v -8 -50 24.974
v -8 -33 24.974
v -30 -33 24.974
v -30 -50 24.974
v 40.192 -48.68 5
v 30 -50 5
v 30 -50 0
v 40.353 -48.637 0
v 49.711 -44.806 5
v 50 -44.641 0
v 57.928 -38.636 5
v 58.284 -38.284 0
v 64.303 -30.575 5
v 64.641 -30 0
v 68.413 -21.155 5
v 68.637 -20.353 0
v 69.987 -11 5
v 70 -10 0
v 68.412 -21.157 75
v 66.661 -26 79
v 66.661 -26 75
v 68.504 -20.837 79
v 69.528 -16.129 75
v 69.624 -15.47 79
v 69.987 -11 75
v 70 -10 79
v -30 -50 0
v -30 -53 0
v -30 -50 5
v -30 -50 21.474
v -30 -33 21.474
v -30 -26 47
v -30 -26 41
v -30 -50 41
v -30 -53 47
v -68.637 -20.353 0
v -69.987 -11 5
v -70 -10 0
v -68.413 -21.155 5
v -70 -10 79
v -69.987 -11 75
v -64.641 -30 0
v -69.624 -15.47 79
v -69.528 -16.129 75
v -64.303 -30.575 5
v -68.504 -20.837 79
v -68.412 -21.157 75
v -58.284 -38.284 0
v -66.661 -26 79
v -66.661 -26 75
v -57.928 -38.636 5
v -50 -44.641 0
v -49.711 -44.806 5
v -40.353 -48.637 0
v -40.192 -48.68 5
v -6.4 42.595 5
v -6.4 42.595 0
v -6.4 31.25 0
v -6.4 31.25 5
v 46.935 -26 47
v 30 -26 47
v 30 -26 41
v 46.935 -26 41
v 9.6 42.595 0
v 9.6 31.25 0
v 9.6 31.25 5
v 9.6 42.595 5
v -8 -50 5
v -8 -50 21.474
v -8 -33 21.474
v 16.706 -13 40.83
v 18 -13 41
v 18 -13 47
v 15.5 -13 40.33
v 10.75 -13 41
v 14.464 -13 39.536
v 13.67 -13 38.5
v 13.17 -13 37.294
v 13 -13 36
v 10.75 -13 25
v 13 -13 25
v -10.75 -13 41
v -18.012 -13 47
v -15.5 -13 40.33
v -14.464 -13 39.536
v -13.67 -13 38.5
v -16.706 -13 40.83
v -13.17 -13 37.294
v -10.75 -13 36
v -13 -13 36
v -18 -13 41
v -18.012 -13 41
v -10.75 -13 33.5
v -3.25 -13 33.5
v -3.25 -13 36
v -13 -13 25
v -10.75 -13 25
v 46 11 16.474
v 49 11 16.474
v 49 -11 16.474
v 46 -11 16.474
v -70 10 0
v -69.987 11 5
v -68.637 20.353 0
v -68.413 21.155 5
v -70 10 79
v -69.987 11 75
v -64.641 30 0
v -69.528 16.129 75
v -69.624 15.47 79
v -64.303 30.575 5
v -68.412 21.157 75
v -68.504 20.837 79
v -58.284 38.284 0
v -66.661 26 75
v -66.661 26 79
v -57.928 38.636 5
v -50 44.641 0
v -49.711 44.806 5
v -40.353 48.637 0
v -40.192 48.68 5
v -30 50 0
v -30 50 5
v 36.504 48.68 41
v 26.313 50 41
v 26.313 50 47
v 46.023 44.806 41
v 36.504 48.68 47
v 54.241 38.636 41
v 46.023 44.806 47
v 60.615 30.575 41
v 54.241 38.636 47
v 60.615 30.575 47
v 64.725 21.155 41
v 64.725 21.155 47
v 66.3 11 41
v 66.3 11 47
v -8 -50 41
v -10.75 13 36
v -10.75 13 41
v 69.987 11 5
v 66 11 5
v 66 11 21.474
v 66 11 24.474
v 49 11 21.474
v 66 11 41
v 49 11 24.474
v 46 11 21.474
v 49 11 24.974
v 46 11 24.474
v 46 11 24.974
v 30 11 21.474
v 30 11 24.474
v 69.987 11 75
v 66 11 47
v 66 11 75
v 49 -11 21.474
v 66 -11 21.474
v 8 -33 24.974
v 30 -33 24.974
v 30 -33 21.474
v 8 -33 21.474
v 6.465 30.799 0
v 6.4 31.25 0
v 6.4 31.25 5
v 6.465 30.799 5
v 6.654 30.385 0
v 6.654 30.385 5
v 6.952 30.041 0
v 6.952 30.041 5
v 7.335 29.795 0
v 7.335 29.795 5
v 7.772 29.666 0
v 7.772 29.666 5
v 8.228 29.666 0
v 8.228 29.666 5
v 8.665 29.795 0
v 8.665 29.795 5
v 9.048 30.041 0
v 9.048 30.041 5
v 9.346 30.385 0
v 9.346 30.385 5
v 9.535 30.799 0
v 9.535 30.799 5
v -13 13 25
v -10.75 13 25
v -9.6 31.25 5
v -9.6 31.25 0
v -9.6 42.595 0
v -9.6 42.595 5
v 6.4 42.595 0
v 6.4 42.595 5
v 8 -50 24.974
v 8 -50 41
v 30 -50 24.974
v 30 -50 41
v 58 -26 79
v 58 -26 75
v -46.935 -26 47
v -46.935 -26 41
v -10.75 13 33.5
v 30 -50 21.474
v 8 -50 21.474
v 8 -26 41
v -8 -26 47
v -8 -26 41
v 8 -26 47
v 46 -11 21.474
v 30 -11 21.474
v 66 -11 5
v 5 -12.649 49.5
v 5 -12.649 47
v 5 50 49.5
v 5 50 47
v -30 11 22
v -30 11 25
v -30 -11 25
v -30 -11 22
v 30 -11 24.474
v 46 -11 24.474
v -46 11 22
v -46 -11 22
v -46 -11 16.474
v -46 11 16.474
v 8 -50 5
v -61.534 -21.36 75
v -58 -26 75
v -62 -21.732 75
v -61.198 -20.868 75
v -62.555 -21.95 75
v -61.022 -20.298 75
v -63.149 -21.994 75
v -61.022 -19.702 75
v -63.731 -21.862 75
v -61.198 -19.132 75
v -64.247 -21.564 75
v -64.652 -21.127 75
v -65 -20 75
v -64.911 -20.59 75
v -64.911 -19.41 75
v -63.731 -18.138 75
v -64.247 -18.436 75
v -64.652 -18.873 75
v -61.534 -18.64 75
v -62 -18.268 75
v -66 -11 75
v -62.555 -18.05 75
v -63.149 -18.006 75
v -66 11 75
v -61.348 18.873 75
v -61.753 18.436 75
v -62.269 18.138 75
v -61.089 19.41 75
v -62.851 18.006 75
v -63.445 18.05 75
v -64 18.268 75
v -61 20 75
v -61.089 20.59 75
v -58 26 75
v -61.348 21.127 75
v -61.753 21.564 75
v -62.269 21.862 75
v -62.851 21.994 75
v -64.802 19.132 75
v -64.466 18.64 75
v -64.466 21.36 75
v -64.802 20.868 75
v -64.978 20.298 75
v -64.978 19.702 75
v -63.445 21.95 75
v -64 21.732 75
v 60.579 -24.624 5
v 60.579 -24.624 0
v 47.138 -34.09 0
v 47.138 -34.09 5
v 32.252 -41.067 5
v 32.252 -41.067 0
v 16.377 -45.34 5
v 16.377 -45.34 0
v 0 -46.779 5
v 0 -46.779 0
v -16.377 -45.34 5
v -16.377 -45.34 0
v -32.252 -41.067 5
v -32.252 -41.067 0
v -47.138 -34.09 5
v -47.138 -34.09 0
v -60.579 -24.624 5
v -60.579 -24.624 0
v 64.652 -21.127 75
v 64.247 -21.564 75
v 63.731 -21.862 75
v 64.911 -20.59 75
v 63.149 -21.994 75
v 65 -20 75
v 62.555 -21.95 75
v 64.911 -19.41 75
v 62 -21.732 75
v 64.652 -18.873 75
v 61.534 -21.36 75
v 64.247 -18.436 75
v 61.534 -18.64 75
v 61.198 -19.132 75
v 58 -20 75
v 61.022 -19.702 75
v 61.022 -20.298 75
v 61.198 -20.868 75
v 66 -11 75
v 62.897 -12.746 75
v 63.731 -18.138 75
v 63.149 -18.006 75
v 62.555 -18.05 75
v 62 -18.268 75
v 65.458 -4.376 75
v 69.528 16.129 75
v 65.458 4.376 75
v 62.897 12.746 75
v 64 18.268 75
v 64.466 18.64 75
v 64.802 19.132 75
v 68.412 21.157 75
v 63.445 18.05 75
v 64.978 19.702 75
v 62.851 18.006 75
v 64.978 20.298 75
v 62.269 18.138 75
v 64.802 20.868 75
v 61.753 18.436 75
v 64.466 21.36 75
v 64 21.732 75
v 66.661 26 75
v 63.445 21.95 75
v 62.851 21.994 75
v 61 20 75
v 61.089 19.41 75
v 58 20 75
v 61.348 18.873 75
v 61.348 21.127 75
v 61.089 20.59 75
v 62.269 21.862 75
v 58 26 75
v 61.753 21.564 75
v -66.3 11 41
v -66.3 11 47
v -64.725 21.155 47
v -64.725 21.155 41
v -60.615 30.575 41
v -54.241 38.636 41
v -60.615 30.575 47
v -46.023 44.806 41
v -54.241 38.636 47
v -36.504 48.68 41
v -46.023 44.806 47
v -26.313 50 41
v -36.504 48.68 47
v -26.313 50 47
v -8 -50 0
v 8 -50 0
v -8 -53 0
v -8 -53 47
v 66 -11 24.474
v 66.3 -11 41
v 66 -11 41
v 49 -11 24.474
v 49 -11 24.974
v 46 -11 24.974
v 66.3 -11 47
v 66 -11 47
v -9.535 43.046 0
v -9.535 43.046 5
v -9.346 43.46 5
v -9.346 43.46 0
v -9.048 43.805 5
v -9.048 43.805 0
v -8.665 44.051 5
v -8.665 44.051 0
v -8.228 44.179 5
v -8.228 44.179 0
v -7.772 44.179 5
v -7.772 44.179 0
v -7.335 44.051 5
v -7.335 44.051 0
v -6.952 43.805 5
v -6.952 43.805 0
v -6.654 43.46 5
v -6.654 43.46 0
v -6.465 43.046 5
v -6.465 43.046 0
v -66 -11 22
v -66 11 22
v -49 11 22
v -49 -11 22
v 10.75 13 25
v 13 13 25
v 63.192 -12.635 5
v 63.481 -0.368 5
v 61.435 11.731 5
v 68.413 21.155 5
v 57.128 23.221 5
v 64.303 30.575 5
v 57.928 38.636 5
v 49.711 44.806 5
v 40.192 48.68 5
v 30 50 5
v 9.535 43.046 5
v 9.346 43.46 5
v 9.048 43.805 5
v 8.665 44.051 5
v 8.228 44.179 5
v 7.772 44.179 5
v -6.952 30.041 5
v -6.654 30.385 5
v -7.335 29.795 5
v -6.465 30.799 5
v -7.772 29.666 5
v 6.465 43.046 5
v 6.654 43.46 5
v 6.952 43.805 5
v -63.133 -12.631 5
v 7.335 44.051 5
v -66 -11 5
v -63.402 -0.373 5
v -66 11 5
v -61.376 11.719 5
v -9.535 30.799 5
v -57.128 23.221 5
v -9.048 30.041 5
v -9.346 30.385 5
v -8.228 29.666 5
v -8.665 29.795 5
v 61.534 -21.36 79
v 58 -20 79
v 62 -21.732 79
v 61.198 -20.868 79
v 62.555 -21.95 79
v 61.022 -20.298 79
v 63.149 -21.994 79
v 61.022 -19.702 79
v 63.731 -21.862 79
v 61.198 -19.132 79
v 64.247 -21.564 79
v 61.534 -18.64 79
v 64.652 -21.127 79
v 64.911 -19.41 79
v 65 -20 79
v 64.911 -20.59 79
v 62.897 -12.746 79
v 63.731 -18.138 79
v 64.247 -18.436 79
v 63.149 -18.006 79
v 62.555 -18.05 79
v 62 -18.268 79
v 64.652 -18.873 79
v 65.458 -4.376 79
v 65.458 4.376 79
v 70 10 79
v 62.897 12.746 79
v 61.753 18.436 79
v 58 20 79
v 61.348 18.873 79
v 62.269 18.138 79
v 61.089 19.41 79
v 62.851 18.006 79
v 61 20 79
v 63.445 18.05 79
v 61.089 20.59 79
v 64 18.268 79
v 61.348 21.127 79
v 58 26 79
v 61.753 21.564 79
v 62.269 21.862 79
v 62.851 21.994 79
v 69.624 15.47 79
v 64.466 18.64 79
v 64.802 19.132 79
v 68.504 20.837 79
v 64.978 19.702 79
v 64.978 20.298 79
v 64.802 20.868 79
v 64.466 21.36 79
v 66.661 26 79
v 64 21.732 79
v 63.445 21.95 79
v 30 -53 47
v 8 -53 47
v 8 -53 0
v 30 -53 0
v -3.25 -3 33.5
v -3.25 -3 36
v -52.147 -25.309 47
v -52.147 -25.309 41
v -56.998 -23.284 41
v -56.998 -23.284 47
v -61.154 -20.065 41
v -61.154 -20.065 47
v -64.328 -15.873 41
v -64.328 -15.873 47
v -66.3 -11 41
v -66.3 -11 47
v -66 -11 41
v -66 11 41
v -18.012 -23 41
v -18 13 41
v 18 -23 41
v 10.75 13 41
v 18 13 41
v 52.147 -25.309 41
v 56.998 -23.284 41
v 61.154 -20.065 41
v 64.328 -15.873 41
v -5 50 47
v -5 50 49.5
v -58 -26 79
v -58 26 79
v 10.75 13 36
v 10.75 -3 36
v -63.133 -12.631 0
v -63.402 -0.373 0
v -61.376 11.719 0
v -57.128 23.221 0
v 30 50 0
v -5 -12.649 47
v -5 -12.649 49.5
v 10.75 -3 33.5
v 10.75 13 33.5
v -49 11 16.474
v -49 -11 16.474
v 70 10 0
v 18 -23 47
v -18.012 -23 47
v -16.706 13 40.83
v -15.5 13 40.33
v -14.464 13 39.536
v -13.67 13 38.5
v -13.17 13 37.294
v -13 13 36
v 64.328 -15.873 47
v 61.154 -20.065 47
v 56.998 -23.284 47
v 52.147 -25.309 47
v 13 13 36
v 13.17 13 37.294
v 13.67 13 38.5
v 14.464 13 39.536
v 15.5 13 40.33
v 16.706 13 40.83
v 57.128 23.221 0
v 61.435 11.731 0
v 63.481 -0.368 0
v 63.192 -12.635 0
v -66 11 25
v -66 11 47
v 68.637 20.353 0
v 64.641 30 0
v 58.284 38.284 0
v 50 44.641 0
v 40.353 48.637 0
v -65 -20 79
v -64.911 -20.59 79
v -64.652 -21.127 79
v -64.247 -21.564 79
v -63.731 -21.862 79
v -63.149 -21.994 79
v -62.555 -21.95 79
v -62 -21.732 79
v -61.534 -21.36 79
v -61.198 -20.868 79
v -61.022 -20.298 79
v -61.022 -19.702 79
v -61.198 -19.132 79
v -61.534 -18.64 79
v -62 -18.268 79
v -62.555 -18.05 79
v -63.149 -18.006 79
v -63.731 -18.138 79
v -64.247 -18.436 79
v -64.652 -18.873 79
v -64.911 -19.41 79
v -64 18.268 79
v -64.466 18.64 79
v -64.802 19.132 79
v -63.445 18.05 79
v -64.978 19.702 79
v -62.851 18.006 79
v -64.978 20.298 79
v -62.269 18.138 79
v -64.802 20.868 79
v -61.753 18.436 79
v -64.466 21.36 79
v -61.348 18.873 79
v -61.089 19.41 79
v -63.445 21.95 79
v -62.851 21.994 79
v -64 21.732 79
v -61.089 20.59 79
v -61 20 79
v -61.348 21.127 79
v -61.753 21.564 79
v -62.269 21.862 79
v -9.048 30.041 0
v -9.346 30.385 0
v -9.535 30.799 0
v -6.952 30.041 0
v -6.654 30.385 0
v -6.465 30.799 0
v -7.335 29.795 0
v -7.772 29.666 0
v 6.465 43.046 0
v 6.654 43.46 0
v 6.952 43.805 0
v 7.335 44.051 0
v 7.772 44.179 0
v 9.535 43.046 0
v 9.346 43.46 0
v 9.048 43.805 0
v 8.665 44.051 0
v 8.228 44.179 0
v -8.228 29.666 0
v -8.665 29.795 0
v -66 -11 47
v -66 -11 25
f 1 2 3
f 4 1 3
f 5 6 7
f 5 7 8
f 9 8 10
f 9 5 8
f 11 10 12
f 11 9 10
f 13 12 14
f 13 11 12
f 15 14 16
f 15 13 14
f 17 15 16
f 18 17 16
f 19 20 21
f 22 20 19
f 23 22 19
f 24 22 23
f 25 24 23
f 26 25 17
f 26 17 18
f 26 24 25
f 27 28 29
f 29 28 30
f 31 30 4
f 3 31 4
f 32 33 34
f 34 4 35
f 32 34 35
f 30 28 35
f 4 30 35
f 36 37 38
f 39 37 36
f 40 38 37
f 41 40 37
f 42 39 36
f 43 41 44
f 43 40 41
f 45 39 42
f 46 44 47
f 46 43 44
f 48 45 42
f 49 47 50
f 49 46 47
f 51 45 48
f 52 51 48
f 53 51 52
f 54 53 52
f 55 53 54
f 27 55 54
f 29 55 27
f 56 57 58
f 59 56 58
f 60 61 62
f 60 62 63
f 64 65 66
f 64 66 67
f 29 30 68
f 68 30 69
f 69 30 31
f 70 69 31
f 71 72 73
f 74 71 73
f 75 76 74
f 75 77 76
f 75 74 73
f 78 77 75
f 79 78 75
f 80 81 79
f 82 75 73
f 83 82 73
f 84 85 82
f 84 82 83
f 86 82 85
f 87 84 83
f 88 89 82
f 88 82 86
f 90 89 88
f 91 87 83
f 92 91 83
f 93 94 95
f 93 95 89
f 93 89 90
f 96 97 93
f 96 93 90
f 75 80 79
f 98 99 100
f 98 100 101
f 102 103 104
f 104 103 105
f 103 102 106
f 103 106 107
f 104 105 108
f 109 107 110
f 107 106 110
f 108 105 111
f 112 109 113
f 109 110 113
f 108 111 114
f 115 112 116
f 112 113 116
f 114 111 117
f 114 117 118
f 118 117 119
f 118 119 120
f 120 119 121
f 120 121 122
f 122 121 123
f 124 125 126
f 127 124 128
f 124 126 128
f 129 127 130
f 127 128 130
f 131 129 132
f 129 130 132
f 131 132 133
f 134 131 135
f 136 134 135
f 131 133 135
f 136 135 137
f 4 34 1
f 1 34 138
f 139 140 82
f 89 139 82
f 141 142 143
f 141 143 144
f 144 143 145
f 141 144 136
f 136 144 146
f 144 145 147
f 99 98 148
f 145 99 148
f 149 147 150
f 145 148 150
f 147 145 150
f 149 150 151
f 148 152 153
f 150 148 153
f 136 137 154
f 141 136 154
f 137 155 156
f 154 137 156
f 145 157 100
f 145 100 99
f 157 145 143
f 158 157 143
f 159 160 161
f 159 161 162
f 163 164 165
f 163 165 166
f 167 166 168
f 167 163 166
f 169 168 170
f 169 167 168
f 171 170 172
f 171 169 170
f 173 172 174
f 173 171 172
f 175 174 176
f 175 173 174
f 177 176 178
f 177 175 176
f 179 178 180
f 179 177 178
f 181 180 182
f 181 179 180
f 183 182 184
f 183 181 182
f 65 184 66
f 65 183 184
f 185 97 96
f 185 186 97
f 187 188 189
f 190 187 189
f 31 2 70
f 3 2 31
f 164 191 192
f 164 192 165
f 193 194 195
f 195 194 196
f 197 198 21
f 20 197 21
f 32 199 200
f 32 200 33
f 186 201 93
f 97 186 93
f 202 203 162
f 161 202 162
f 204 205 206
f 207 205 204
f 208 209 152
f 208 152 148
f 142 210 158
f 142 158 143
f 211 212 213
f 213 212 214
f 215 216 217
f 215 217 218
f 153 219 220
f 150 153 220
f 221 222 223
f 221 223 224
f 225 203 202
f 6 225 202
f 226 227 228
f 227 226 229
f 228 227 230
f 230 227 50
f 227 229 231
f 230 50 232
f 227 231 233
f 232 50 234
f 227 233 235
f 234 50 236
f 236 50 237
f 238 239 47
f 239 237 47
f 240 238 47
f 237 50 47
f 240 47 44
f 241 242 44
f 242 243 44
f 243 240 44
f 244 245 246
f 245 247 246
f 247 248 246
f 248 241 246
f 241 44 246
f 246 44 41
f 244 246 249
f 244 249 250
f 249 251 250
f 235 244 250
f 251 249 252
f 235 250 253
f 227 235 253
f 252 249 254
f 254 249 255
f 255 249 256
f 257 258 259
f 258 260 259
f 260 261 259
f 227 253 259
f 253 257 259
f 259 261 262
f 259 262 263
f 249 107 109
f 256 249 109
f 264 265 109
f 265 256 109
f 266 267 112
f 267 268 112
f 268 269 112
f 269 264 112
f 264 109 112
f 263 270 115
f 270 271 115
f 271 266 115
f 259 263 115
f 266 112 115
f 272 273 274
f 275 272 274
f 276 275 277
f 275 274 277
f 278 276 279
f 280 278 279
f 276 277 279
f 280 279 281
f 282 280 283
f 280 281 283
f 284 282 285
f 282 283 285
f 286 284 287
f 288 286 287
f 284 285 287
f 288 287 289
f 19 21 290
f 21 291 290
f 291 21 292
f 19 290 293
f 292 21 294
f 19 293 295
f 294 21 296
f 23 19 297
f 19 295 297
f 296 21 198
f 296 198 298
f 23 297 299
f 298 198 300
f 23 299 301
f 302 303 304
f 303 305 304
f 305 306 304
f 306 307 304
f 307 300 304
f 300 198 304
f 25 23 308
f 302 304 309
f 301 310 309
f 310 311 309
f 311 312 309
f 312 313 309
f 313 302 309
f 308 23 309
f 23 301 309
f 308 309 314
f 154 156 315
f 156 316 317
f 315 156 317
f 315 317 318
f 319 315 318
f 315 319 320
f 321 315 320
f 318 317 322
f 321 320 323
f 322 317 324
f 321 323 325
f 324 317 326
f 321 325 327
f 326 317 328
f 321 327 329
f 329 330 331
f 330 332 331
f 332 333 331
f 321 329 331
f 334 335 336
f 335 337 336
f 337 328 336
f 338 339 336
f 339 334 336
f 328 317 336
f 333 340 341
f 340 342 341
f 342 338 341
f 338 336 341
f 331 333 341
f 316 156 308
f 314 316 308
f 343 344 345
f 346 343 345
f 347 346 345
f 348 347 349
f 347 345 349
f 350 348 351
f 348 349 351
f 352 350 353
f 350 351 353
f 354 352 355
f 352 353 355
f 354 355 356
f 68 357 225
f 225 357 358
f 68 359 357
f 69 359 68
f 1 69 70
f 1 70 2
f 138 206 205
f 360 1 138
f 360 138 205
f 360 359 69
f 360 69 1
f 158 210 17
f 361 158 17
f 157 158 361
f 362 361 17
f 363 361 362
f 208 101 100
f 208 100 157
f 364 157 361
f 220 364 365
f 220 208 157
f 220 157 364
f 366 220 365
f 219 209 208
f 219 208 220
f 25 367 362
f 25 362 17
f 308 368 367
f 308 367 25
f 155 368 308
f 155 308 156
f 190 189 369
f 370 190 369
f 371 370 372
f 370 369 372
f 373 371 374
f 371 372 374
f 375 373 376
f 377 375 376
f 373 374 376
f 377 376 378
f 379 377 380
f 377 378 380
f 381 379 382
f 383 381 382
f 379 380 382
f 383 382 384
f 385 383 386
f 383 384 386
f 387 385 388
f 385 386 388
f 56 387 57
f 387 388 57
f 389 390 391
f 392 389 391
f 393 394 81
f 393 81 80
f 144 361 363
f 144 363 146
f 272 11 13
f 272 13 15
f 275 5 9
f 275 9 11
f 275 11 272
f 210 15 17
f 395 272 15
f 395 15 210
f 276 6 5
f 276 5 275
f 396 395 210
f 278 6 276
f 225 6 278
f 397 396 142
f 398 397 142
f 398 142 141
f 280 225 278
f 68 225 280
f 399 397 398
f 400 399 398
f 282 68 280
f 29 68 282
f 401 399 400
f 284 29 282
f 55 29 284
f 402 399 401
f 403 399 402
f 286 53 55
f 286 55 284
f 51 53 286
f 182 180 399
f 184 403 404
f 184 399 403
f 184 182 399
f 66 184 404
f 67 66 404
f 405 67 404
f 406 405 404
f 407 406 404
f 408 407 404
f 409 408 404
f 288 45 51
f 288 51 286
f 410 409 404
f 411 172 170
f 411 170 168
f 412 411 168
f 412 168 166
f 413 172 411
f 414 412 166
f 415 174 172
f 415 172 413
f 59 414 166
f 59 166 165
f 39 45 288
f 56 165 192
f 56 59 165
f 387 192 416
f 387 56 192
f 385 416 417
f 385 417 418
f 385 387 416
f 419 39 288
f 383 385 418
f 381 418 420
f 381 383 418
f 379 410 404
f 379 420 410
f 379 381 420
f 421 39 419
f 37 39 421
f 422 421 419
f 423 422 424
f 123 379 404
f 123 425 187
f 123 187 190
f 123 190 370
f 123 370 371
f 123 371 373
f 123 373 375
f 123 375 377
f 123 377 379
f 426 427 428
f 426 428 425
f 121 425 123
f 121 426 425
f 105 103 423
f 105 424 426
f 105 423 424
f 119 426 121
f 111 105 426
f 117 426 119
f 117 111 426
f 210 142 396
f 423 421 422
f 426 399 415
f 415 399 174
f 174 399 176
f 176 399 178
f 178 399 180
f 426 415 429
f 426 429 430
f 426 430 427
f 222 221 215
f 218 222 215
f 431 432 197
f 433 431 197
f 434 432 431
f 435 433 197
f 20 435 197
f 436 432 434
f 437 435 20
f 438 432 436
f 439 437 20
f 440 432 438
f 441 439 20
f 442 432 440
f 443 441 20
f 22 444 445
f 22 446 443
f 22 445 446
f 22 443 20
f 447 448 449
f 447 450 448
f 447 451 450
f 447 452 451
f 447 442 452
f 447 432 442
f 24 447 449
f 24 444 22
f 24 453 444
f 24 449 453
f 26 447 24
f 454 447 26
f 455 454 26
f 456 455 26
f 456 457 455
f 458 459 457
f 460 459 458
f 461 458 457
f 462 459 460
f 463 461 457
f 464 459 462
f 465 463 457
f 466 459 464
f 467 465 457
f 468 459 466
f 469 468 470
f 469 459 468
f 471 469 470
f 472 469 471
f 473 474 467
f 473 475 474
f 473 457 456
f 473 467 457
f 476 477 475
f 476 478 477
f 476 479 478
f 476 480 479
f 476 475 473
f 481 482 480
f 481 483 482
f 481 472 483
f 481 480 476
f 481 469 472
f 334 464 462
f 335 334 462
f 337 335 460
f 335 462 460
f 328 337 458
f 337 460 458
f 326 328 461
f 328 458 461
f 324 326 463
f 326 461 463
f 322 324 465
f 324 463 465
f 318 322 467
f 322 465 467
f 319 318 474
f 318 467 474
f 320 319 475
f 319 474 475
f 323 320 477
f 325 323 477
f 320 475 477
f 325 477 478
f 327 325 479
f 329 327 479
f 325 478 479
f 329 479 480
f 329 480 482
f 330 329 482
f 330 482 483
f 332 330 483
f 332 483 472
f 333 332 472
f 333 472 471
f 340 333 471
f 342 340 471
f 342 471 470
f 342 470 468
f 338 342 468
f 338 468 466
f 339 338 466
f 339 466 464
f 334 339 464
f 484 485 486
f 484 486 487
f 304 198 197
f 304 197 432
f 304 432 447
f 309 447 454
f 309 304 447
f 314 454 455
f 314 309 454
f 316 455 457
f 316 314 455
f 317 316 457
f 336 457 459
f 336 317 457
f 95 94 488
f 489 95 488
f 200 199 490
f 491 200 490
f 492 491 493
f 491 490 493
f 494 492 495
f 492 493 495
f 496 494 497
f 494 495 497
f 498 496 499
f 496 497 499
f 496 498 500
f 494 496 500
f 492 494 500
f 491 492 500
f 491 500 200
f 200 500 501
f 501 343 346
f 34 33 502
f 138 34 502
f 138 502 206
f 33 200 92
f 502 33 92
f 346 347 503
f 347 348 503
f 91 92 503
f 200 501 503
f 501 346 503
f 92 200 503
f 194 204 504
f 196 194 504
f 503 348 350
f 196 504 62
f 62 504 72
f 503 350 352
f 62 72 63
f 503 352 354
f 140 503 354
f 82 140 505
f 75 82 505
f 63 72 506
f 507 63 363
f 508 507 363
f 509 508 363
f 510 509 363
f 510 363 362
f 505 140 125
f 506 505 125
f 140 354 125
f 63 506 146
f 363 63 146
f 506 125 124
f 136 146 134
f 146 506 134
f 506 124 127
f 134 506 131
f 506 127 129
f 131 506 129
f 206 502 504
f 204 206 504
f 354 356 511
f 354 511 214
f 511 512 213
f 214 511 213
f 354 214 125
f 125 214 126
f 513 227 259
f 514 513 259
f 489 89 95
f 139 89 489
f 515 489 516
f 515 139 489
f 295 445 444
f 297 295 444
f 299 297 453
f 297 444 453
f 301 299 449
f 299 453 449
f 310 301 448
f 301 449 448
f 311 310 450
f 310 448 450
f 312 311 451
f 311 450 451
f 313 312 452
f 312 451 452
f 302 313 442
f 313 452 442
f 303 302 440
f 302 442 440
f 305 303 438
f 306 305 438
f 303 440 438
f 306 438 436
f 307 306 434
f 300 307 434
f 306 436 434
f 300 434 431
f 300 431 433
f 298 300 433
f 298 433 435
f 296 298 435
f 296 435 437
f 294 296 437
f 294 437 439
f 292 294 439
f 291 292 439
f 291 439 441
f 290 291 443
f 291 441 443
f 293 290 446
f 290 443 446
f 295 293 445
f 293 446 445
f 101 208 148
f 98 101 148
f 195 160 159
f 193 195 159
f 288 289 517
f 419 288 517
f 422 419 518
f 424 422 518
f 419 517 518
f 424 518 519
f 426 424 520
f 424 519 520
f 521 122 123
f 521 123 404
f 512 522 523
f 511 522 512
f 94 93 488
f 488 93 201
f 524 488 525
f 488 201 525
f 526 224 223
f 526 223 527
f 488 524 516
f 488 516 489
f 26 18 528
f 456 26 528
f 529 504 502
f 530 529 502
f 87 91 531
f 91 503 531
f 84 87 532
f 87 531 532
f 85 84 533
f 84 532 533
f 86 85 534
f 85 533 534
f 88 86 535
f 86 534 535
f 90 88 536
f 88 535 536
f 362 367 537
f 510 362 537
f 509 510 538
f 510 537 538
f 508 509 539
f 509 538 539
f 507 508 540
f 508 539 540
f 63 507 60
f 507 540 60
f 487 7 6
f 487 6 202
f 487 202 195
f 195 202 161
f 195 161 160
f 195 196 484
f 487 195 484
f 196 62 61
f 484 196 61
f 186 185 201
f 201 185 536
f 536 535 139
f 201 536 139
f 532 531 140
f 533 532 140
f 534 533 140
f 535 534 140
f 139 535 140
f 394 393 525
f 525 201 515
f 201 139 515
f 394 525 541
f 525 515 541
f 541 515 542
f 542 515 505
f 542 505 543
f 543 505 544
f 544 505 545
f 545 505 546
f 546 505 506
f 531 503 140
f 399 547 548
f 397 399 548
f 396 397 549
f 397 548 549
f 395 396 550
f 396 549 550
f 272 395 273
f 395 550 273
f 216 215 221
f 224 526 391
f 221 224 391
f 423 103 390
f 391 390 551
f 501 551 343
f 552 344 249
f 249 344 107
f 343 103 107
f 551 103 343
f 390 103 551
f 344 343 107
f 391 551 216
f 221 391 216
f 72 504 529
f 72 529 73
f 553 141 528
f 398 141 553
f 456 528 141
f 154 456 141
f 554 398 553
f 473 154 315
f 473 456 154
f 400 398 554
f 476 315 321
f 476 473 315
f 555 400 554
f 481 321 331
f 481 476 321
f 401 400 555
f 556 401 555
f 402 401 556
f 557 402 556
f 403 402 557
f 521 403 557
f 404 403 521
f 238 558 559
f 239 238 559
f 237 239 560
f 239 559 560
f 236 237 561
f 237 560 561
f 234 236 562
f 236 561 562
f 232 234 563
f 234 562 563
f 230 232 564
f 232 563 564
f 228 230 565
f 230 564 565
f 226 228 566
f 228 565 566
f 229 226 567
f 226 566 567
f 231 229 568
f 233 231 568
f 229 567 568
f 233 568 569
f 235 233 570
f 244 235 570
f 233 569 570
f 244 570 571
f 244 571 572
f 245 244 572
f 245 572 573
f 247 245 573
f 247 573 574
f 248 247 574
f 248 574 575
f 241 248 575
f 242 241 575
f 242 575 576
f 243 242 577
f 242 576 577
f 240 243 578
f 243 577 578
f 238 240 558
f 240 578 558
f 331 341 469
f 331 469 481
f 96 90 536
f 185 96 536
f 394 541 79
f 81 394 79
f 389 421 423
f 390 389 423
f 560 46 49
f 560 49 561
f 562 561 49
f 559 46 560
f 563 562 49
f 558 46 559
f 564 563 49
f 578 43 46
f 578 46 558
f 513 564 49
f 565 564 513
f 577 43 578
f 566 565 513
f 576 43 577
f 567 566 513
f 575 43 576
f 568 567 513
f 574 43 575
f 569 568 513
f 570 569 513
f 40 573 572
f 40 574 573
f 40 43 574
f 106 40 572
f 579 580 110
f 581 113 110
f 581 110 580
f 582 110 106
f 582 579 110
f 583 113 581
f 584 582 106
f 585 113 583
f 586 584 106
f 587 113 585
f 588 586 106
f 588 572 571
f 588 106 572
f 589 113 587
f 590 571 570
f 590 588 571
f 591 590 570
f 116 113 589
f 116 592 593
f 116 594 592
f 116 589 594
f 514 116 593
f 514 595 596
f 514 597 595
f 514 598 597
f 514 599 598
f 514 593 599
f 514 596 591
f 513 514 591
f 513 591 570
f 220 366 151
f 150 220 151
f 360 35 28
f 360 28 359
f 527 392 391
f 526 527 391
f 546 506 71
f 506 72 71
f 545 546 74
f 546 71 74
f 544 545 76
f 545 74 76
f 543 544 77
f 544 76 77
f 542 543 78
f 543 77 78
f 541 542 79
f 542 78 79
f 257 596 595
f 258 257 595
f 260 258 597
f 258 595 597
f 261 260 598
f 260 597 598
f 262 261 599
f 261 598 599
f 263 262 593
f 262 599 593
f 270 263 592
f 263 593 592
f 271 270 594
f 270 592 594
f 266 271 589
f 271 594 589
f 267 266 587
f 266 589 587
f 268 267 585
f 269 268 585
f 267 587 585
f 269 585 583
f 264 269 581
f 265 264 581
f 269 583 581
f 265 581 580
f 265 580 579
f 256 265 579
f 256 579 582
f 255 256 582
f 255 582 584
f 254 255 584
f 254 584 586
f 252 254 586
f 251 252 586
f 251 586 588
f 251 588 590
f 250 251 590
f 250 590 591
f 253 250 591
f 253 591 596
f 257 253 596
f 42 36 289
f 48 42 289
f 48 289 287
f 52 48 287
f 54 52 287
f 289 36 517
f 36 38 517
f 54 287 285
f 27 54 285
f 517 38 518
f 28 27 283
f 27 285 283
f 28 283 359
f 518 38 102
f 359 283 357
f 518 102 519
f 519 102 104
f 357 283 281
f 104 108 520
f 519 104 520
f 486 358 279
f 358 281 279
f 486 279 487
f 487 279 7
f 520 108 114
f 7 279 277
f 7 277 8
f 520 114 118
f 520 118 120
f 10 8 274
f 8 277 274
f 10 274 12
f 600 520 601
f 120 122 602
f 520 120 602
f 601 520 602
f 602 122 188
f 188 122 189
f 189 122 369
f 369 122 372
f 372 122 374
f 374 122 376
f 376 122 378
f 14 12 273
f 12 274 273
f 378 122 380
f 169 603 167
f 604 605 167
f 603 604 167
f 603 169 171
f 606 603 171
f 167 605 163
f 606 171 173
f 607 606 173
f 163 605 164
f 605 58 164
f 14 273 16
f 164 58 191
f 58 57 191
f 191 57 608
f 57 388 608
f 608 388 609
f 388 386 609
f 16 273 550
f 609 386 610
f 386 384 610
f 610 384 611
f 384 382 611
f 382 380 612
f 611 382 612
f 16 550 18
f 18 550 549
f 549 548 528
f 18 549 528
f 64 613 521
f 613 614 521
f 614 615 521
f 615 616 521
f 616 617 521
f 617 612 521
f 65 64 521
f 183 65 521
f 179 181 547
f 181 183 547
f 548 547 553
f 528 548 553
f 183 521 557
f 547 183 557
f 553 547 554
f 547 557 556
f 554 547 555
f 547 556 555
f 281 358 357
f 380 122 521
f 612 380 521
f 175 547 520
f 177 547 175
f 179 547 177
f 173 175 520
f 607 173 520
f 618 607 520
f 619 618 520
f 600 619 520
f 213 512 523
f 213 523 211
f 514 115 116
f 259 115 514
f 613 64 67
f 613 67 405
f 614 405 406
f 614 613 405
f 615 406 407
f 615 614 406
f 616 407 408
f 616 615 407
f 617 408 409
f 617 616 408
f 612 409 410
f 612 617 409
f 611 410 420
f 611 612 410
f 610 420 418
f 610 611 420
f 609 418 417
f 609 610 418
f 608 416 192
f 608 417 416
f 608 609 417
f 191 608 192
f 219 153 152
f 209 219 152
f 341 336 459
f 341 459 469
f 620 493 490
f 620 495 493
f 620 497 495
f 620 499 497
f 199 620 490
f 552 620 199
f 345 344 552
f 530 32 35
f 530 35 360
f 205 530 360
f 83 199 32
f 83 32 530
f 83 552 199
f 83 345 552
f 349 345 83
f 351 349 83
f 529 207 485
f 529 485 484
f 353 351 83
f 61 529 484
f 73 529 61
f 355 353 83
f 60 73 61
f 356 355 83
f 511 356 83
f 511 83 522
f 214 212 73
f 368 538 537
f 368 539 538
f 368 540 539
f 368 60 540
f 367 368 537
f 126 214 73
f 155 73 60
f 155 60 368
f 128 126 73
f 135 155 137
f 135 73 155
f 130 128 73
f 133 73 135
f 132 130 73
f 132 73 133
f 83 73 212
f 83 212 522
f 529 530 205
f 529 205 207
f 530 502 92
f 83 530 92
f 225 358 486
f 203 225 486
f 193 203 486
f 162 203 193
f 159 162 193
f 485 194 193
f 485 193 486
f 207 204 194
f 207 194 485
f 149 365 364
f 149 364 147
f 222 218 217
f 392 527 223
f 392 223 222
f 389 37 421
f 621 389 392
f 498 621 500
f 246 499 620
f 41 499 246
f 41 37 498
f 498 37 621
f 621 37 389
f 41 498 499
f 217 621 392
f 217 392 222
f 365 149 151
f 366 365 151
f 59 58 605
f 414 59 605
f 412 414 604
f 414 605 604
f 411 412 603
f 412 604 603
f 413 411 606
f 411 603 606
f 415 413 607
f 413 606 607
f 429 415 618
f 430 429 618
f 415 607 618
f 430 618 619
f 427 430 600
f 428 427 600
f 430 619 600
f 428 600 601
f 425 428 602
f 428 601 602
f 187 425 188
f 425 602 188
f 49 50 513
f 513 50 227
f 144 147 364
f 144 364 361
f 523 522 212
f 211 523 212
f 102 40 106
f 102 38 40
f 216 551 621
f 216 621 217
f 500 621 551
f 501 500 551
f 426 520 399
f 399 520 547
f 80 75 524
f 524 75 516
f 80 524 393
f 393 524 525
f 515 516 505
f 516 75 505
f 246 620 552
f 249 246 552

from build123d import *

# Parameters (mm, degrees)
SKETCH1_W                 = 140
SKETCH1_H                 = 100
BOSS_EXTRUDE1_DEPTH       = 5
SKETCH2_W                 = 4
SKETCH2_H                 = 52
BOSS_EXTRUDE2_DEPTH       = 70
SKETCH3_W                 = 12
SKETCH3_H                 = 52
BOSS_EXTRUDE3_DEPTH       = 4
SKETCH4_R                 = 2
CUT_EXTRUDE1_DEPTH        = 4
SKETCH5_W                 = 70
SKETCH5_H                 = 15
CUT_EXTRUDE3_DEPTH        = 169.347854159
FILLET1_R                 = 40
CUT_EXTRUDE6_DEPTH        = 10
SKETCH11_W                = 22
SKETCH11_H                = 41
BOSS_EXTRUDE6_DEPTH       = 3
SKETCH12_W                = 22
SKETCH12_H                = 6
BOSS_EXTRUDE7_DEPTH       = 30
SKETCH15_W                = 132.6
SKETCH15_H                = 76
BOSS_EXTRUDE8_DEPTH       = 6
FILLET2_R                 = 40
FILLET3_R                 = 20
CUT_EXTRUDE13_DEPTH       = 10
SKETCH25_W                = 10
SKETCH25_H                = 62.648578198
BOSS_EXTRUDE9_DEPTH       = 2.5
BOSS_EXTRUDE10_DEPTH      = 16
SKETCH27_W                = 21.5
SKETCH27_H                = 2.5
BOSS_EXTRUDE11_DEPTH      = 26
FILLET4_R                 = 5
SKETCH29_W                = 14
SKETCH29_H                = 10
CUT_EXTRUDE14_DEPTH       = 5
CUT_EXTRUDE15_DEPTH       = 5
SKETCH33_W                = 36
SKETCH33_H                = 3
BOSS_EXTRUDE12_DEPTH      = 22
BOSS_EXTRUDE13_DEPTH      = 5
BOSS_EXTRUDE13_DEPTH_BACK = 3.5
SKETCH34_W                = 22
SKETCH34_H                = 17
SKETCH34_W_2              = 3
SKETCH34_H_2              = 22
SKETCH35_W                = 5
SKETCH35_H                = 17
CUT_EXTRUDE16_DEPTH       = 139.021737418
SKETCH36_W                = 36.01199305
SKETCH36_H                = 10
CUT_EXTRUDE17_DEPTH       = 8


with BuildPart() as part:
    # Sketch1 → Boss-Extrude1 (new body)
    with BuildSketch(Plane.XY):
        Rectangle(SKETCH1_W, SKETCH1_H)
    extrude(amount=BOSS_EXTRUDE1_DEPTH)

    # Sketch2 → Boss-Extrude2 (add)
    with BuildSketch(Plane.XY.offset(5)):
        with Locations((-68, 0)):
            Rectangle(SKETCH2_W, SKETCH2_H)
        with Locations((68, 0)):
            Rectangle(SKETCH2_W, SKETCH2_H)
    extrude(amount=BOSS_EXTRUDE2_DEPTH)

    # Sketch3 → Boss-Extrude3 (add)
    with BuildSketch(Plane.XY.offset(75)):
        with Locations((-64, 0)):
            Rectangle(SKETCH3_W, SKETCH3_H)
        with Locations((64, 0)):
            Rectangle(SKETCH3_W, SKETCH3_H)
    extrude(amount=BOSS_EXTRUDE3_DEPTH)

    # Sketch4 → Cut-Extrude1 (cut)
    with BuildSketch(Plane.XY.offset(79)):
        with Locations((-63, 20)):
            Circle(SKETCH4_R)
        with Locations(Location((-63, -20, 0), (0, 0, 180))):
            Circle(SKETCH4_R)
        with Locations(Location((63, 20, 0), (0, 0, 180))):
            Circle(SKETCH4_R)
        with Locations((63, -20)):
            Circle(SKETCH4_R)
    extrude(amount=-CUT_EXTRUDE1_DEPTH, mode=Mode.SUBTRACT)

    # Sketch5 → Cut-Extrude3 (cut, through all)
    with BuildSketch(Plane.ZY.offset(70)):
        with Locations((40, 18.5)):
            Rectangle(SKETCH5_W, SKETCH5_H)
        with Locations((40, -18.5)):
            Rectangle(SKETCH5_W, SKETCH5_H)
    extrude(amount=-CUT_EXTRUDE3_DEPTH, mode=Mode.SUBTRACT)

    # Fillet1
    fillet1_edges = [part.edges().sort_by_distance(p)[0] for p in [
        (70, -50, 2.5),
        (70, 50, 2.5),
        (-70, 50, 2.5),
        (-70, -50, 2.5),
    ]]
    fillet(fillet1_edges, radius=FILLET1_R)

    # Sketch9 → Cut-Extrude6 (cut)
    with BuildSketch(Plane(origin=(0, 0, 0), x_dir=(-1, 0, 0), z_dir=(0, 0, -1))):
        with BuildLine():
            Line((-6.4, 42.595375442), (-6.4, 31.250081589))
            ThreePointArc((-6.4, 31.250081589), (-8, 29.650081589), (-9.6, 31.250081589))
            Line((-9.6, 31.250081589), (-9.6, 42.595375442))
            ThreePointArc((-9.6, 42.595375442), (-8, 44.195375442), (-6.4, 42.595375442))
        make_face()
        with BuildLine():
            Line((6.4, 42.595375442), (6.4, 31.250081589))
            ThreePointArc((6.4, 31.250081589), (8, 29.650081589), (9.6, 31.250081589))
            Line((9.6, 31.250081589), (9.6, 42.595375442))
            ThreePointArc((9.6, 42.595375442), (8, 44.195375442), (6.4, 42.595375442))
        make_face()
    extrude(amount=-CUT_EXTRUDE6_DEPTH, mode=Mode.SUBTRACT)

    # Sketch11 → Boss-Extrude6 (add)
    with BuildSketch(Plane.XZ.offset(50)):
        with Locations((-19, 20.5)):
            Rectangle(SKETCH11_W, SKETCH11_H)
        with Locations((19, 20.5)):
            Rectangle(SKETCH11_W, SKETCH11_H)
    extrude(amount=BOSS_EXTRUDE6_DEPTH)

    # Sketch12 → Boss-Extrude7 (add)
    with BuildSketch(Plane.XZ.offset(53)):
        with Locations((-19, 44)):
            Rectangle(SKETCH12_W, SKETCH12_H)
        with Locations((19, 44)):
            Rectangle(SKETCH12_W, SKETCH12_H)
    extrude(amount=-BOSS_EXTRUDE7_DEPTH)

    # Sketch15 → Boss-Extrude8 (add)
    with BuildSketch(Plane.XY.offset(47)):
        with Locations((0, 12)):
            Rectangle(SKETCH15_W, SKETCH15_H)
    extrude(amount=-BOSS_EXTRUDE8_DEPTH)

    # Fillet2
    # the kernel refuses this fillet: 40 mm, written as the material it takes off along each edge
    with BuildSketch(Plane(origin=(66.3, 50, 146.968745116), x_dir=(0, -1, 0), z_dir=(0, 0, -1))) as fillet2_piece_1_section:
        with BuildLine():
            CenterArc((40, 39.987498046), FILLET2_R, 180, 88.567456262)
            Line((0, 39.987498046), (0, 0))
            Line((0, 0), (39, 0))
        make_face()
    fillet2_piece_1 = extrude(amount=105.968745116, mode=Mode.PRIVATE)
    fillet2_piece_1 = split(fillet2_piece_1, bisect_by=Plane(origin=(65.992272223, 15.649976228, 75), z_dir=(0, 0, -1)), keep=Keep.TOP, mode=Mode.PRIVATE)
    add(fillet2_piece_1, mode=Mode.SUBTRACT)
    with BuildSketch(Plane(origin=(-66.3, 50, 146.968745116), x_dir=(0, -1, 0), z_dir=(0, 0, -1))) as fillet2_piece_2_section:
        with BuildLine():
            CenterArc((40, -39.987498046), FILLET2_R, 91.432543738, 88.567456262)
            Line((0, -39.987498046), (0, 0))
            Line((0, 0), (39, 0))
        make_face()
    fillet2_piece_2 = extrude(amount=105.968745116, mode=Mode.PRIVATE)
    fillet2_piece_2 = split(fillet2_piece_2, bisect_by=Plane(origin=(-65.992272223, 15.649976228, 75), z_dir=(0, 0, -1)), keep=Keep.TOP, mode=Mode.PRIVATE)
    add(fillet2_piece_2, mode=Mode.SUBTRACT)

    # Fillet3
    # the kernel refuses this fillet: 20 mm, written as the material it takes off along each edge
    with BuildSketch(Plane(origin=(66.3, -26, 47), x_dir=(0, 1, 0), z_dir=(0, 0, -1))) as fillet3_piece_1_section:
        with BuildLine():
            CenterArc((20, -19.364916731), FILLET3_R, 104.477512186, 75.522487814)
            Line((0, -19.364916731), (0, 0))
            Line((0, 0), (15, 0))
        make_face()
    fillet3_piece_1 = extrude(amount=54.412291828, mode=Mode.PRIVATE)
    fillet3_piece_1 = split(fillet3_piece_1, bisect_by=Plane(origin=(64.996360144, -14.682849628, 5), z_dir=(0, 0, 1)), keep=Keep.TOP, mode=Mode.PRIVATE)
    add(fillet3_piece_1, mode=Mode.SUBTRACT)
    with BuildSketch(Plane(origin=(-66.3, -26, 47), x_dir=(1, 0, 0), z_dir=(0, 0, -1))) as fillet3_piece_2_section:
        with BuildLine():
            CenterArc((19.364916731, -20), FILLET3_R, 90, 75.522487814)
            Line((0, -15), (0, 0))
            Line((0, 0), (19.364916731, 0))
        make_face()
    fillet3_piece_2 = extrude(amount=54.412291828, mode=Mode.PRIVATE)
    fillet3_piece_2 = split(fillet3_piece_2, bisect_by=Plane(origin=(-52.725602454, -25.185189276, 5), z_dir=(0, 0, 1)), keep=Keep.TOP, mode=Mode.PRIVATE)
    add(fillet3_piece_2, mode=Mode.SUBTRACT)

    # Sketch24 → Cut-Extrude13 (cut)
    with BuildSketch(Plane(origin=(0, 0, 0), x_dir=(-1, 0, 0), z_dir=(0, 0, -1))):
        with BuildLine():
            Line((57.127807538, 23.220760353), (-57.127807538, 23.220760353))
            ThreePointArc((-57.127807538, 23.220760353), (-63.480824357, -0.367653581), (-60.579297228, -24.623688601))
            ThreePointArc((-60.579297228, -24.623688601), (0, -46.779239647), (60.579297228, -24.623688601))
            ThreePointArc((60.579297228, -24.623688601), (63.401945013, -0.373343922), (57.127807538, 23.220760353))
        make_face()
    extrude(amount=-CUT_EXTRUDE13_DEPTH, mode=Mode.SUBTRACT)

    # Sketch25 → Boss-Extrude9 (add)
    with BuildSketch(Plane.XY.offset(47)):
        with Locations((0, 18.675710901)):
            Rectangle(SKETCH25_W, SKETCH25_H)
    extrude(amount=BOSS_EXTRUDE9_DEPTH)

    # Sketch26 → Boss-Extrude10 (add)
    with BuildSketch(Plane(origin=(0, 0, 41), x_dir=(-1, 0, 0), z_dir=(0, 0, -1))):
        Polygon((-10.75, -13), (-10.75, -11), (-10.75, 11), (-10.75, 13), (-13, 13), (-13, -13), align=None)
        Polygon((10.75, 11), (10.75, -11), (10.75, -13), (13, -13), (13, 13), (10.75, 13), align=None)
    extrude(amount=BOSS_EXTRUDE10_DEPTH)

    # Sketch27 → Boss-Extrude11 (add)
    with BuildSketch(Plane(origin=(0, 13, 0), x_dir=(1, 0, 0), z_dir=(0, 1, 0))):
        with Locations((0, -34.75)):
            Rectangle(SKETCH27_W, SKETCH27_H)
    extrude(amount=-BOSS_EXTRUDE11_DEPTH)

    # Fillet4
    fillet4_edges = [part.edges().sort_by_distance(p)[0] for p in [
        (13, 0, 41),
        (-13, 0, 41),
    ]]
    fillet(fillet4_edges, radius=FILLET4_R)

    # Sketch29 → Cut-Extrude14 (cut)
    with BuildSketch(Plane(origin=(0, 0, 33.5), x_dir=(-1, 0, 0), z_dir=(0, 0, -1))):
        with Locations((-3.75, -8)):
            Rectangle(SKETCH29_W, SKETCH29_H)
    extrude(amount=-CUT_EXTRUDE14_DEPTH, mode=Mode.SUBTRACT)

    # Sketch30 → Cut-Extrude15 (cut)
    with BuildSketch(Plane(origin=(0, 0, 75), x_dir=(-1, 0, 0), z_dir=(0, 0, -1))):
        with BuildLine():
            Line((-58, 20), (-58, -20))
            ThreePointArc((-58, -20), (-65.783189716, 0), (-58, 20))
        make_face()
    extrude(amount=-CUT_EXTRUDE15_DEPTH, mode=Mode.SUBTRACT)

    # Sketch33 → Boss-Extrude12 (add)
    with BuildSketch(Plane(origin=(0, 11, 0), x_dir=(1, 0, 0), z_dir=(0, 1, 0))):
        with Locations((-48, -23.5)):
            Rectangle(SKETCH33_W, SKETCH33_H)
        with Locations((48, -22.973655472)):
            Rectangle(SKETCH33_W, SKETCH33_H)
    extrude(amount=-BOSS_EXTRUDE12_DEPTH)

    # Sketch34 → Boss-Extrude13 (add, two sides: drawn at the far end of the back side and taken through both)
    with BuildSketch(Plane(origin=(0, 0, 21.473655472), x_dir=(-1, 0, 0), z_dir=(0, 0, -1)).offset(-BOSS_EXTRUDE13_DEPTH_BACK)):
        with Locations((19, -41.5)):
            Rectangle(SKETCH34_W, SKETCH34_H)
        with Locations((47.5, 0)):
            Rectangle(SKETCH34_W_2, SKETCH34_H_2)
        with Locations((-19, -41.5)):
            Rectangle(SKETCH34_W, SKETCH34_H)
        with Locations((-47.5, 0)):
            Rectangle(SKETCH34_W_2, SKETCH34_H_2)
    extrude(amount=BOSS_EXTRUDE13_DEPTH + BOSS_EXTRUDE13_DEPTH_BACK)

    # Sketch35 → Cut-Extrude16 (cut, through all)
    with BuildSketch(Plane.ZY.offset(30)):
        with Locations((18.973655472, -41.5)):
            Rectangle(SKETCH35_W, SKETCH35_H)
    extrude(amount=-CUT_EXTRUDE16_DEPTH, mode=Mode.SUBTRACT)

    # Sketch36 → Cut-Extrude17 (cut)
    with BuildSketch(Plane(origin=(0, 0, 41), x_dir=(-1, 0, 0), z_dir=(0, 0, -1))):
        with Locations((0.005996525, -18)):
            Rectangle(SKETCH36_W, SKETCH36_H)
    extrude(amount=-CUT_EXTRUDE17_DEPTH, mode=Mode.SUBTRACT)


solid = part.part
